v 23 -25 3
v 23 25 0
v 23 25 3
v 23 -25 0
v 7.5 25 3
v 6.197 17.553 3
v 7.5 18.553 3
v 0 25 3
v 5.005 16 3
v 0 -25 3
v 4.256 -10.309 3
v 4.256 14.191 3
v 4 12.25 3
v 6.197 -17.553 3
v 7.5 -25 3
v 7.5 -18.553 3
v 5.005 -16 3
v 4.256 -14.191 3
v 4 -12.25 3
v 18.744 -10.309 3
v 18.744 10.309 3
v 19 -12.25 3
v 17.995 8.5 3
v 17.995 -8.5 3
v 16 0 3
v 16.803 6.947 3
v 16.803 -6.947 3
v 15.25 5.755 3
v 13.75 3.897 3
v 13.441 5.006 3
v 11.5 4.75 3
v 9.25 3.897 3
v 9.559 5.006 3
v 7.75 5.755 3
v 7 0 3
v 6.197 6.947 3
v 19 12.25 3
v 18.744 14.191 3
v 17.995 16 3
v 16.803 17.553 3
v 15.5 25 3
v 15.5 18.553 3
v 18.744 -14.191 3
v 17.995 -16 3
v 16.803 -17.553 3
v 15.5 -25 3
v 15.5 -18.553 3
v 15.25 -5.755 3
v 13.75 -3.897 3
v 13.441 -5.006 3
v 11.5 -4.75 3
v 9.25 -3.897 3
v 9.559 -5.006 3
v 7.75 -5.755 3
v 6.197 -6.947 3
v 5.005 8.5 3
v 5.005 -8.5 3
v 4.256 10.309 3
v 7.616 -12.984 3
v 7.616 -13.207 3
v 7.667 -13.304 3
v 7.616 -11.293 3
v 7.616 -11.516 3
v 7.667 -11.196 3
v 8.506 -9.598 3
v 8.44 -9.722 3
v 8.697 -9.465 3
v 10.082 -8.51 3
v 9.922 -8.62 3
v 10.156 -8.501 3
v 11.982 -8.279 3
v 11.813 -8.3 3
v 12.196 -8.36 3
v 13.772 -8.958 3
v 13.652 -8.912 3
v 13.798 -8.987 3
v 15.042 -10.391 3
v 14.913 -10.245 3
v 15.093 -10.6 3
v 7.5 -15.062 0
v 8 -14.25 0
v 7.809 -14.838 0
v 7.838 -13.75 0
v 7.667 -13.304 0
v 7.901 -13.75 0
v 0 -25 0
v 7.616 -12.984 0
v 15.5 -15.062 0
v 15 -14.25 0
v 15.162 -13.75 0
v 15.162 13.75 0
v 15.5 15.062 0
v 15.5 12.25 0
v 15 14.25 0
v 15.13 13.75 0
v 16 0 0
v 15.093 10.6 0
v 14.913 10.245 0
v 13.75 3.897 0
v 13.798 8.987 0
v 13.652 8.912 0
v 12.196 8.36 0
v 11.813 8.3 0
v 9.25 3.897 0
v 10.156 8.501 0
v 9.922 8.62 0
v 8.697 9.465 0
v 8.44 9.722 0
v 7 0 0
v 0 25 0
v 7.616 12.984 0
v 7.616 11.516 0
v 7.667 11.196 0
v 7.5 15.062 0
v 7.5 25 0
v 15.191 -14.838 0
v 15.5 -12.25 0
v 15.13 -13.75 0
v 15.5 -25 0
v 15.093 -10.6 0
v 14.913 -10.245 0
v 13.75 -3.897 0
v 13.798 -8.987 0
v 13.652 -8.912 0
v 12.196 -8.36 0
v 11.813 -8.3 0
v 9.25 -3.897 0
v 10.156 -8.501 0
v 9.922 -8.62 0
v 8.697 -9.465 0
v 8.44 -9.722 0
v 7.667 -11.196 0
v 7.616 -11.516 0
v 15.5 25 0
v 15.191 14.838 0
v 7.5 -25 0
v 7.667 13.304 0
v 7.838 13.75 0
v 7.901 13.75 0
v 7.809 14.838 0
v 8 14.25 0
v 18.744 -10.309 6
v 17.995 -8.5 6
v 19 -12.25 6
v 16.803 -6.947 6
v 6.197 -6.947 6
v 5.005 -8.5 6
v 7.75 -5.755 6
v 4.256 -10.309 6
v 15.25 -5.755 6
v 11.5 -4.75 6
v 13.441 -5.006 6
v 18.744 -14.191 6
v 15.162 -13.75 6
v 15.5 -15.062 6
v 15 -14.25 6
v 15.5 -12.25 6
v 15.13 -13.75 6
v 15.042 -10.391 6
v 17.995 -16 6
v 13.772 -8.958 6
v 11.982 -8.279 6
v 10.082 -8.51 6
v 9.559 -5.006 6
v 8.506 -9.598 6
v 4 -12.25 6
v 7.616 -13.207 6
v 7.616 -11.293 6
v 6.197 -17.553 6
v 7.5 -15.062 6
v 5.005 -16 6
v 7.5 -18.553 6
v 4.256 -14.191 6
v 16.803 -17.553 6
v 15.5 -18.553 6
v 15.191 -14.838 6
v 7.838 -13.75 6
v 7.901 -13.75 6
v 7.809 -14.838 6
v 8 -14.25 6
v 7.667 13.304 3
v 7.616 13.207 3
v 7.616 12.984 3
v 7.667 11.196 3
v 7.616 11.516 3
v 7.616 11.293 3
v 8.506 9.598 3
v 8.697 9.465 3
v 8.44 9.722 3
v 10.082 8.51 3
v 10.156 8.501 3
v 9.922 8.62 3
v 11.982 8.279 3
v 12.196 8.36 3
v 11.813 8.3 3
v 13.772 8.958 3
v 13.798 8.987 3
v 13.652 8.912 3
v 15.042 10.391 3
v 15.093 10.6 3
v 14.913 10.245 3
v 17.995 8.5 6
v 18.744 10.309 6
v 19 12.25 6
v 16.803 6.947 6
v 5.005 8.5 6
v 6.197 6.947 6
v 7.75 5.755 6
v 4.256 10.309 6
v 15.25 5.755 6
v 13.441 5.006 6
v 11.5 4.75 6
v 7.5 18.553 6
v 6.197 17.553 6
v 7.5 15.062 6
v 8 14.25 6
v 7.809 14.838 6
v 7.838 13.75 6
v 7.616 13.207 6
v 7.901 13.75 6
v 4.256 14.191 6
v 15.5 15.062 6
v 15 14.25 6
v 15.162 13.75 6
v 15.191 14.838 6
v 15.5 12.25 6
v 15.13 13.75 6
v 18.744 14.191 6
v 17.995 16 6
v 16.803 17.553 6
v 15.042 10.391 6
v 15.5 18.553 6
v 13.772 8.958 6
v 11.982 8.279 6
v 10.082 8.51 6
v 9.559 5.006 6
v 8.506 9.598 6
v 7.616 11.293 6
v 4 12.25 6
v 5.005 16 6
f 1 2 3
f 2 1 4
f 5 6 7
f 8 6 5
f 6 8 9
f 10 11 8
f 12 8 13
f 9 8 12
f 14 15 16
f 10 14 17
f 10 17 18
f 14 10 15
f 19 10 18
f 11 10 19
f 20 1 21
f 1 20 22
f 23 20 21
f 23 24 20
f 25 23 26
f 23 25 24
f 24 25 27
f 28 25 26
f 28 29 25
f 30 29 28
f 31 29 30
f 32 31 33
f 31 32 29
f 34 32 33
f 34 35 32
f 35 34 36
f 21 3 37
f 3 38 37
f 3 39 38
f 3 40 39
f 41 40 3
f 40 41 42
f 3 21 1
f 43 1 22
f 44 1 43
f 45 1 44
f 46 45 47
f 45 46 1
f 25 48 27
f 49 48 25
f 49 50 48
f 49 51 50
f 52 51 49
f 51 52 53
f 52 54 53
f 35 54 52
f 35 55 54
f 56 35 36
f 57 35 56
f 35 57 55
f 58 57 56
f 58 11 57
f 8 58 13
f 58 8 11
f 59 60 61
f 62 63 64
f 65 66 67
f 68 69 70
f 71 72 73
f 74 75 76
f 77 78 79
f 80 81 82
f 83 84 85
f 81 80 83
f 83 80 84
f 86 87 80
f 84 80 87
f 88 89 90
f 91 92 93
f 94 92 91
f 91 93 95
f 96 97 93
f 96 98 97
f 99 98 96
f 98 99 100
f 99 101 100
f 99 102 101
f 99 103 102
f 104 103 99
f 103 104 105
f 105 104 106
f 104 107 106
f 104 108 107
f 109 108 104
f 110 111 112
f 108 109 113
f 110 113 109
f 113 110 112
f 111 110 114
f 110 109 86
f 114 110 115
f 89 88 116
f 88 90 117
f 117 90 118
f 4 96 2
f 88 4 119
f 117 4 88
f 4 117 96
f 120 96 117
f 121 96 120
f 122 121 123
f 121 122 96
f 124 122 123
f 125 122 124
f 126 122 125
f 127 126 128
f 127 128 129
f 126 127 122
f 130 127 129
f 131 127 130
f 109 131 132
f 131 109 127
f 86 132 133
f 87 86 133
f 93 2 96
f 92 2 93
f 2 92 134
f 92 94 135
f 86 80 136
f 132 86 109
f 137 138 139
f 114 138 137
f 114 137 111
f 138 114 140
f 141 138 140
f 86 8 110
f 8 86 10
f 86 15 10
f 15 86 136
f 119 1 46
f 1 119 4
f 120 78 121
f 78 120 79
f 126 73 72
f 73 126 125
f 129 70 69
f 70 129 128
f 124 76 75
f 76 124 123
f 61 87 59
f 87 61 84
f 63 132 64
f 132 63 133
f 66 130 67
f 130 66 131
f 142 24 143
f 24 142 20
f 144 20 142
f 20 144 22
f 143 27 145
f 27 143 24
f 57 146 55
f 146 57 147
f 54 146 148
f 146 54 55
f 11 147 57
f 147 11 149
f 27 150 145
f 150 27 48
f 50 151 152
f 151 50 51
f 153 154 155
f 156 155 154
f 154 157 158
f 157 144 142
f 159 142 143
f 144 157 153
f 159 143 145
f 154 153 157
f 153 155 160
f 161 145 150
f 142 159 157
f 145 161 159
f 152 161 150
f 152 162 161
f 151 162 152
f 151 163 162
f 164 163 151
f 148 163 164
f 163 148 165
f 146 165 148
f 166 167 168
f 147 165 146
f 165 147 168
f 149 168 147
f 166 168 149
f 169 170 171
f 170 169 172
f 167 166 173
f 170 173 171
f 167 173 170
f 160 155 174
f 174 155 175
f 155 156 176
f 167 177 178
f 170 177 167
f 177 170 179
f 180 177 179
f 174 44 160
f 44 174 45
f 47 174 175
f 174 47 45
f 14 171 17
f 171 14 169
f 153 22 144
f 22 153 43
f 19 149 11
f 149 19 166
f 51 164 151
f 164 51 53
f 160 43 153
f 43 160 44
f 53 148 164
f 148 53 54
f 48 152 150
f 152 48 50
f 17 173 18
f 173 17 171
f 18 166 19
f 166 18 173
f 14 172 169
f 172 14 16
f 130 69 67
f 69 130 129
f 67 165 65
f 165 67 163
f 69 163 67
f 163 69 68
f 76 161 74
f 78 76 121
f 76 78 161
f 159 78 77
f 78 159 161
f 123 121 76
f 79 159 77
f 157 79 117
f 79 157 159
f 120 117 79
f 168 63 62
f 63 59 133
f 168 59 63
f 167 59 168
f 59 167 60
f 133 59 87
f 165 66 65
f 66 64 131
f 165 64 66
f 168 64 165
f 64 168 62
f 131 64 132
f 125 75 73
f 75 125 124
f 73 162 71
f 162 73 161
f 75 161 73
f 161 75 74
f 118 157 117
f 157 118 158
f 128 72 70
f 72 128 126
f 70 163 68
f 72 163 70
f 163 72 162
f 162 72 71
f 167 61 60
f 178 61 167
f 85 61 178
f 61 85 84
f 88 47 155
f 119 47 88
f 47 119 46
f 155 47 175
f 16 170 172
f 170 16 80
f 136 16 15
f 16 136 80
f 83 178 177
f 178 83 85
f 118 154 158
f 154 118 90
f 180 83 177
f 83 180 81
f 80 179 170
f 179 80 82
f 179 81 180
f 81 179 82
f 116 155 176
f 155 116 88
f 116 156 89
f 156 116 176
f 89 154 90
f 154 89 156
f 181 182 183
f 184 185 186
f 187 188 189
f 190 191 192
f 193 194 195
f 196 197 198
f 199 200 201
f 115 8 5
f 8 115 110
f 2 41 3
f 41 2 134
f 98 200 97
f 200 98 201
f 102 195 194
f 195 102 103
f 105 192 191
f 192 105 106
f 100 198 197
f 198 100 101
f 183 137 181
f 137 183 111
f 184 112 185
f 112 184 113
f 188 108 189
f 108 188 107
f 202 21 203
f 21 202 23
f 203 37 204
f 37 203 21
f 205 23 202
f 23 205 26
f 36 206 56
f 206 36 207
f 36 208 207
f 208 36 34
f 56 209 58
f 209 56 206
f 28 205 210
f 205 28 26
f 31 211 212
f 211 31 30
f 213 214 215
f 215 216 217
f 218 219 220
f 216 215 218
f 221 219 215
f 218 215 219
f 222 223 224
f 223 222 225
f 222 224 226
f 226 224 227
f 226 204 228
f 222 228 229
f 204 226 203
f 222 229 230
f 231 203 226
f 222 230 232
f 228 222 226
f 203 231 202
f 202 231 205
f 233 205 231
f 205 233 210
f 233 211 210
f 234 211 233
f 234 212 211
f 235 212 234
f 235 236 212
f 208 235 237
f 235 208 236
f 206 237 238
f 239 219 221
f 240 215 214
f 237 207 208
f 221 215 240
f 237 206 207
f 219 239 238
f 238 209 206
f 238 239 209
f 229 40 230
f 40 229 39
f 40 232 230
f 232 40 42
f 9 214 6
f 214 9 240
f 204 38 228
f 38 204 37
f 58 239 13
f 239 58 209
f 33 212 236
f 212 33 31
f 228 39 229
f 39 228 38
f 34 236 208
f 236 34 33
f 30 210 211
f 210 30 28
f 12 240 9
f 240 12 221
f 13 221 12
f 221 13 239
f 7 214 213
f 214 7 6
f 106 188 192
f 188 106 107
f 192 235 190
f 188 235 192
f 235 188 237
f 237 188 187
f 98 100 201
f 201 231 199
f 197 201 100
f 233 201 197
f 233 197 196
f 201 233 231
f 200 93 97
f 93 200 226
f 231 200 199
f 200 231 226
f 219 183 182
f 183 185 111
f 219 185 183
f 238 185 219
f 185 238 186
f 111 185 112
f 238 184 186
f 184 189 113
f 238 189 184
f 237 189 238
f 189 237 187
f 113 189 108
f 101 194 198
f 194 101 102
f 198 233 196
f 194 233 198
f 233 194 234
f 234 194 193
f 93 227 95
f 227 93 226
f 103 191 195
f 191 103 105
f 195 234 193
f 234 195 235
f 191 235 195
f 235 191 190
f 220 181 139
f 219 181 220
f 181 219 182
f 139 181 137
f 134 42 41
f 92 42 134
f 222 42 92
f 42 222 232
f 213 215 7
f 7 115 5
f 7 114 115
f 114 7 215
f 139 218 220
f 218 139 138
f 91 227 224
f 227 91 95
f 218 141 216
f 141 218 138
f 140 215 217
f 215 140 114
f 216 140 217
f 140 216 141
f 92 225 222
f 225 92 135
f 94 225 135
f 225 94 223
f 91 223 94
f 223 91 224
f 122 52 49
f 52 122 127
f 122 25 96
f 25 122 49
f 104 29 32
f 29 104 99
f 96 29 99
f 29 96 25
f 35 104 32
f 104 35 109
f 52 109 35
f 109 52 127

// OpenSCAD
dist_M8=24.5; //distance between M8 center
side_x=23;  //X measure
side_y=50;  //Y measure
thickness=3; //thickness
thick_high=thickness+3; //higher thickness
thick_donut=3.5; //thickness donut M8
central_nut=4.5; //central nut
nut_precision=6; //central hole number of faces

//MAIN PIECE
difference(){ //necessary for nut presence
  union(){
    translate([0, -1*side_y/2, 0])
    main();
    mirror([0, 1, 0])
    translate([0, -1*side_y/2, 0])
    main();
  }
  translate([side_x/2, 0, 0])
  cylinder(r=central_nut, h=10,$fn=nut_precision, center=true);
}

module main() {
union(){  //UNION for translating before mirroring
difference(){ //DIFFERENCE with cube1
  union() {
    difference(){
      cube([side_x,side_y/2,thickness]);
      translate([side_x/2, (side_y-dist_M8)/2, 0]) foro();}
    translate([side_x/2, (side_y-dist_M8)/2, 0]) bordi();
          }
  translate([side_x/2-4, 0, 0]) cube(size=[8, (side_y-dist_M8)/2-1.5, 10], center=false); //cube1
            }
#translate([side_x/2-4, (side_y-dist_M8)/2-2, 0]) tondi(); // to reduce M8 hole and block them
} //fine UNION
}

module foro () {  //hole for smooth rod M8
  cylinder(r=8/2, h=thick_high, $fn=20, center=false);
}

module bordi () {
  difference() {
    cylinder(r=8/2+thick_donut, h=thick_high, center=false);
    cylinder(r=8/2, h=thick_high, center=false);
  }

}

module tondi() {
  translate([0, -5, 0]) {
    intersection() {
      cube(size=[8, 10,10], center=false);
        union(){
        translate([-0.5, 5, 0])
        cylinder(r=1, h=thick_high, $fn=10, center=false);    //rounded left
        translate([8.5, 5, 0])
        cylinder(r=1, h=thick_high, $fn=10, center=false);  //rounded right
        }
    }
  }
}
